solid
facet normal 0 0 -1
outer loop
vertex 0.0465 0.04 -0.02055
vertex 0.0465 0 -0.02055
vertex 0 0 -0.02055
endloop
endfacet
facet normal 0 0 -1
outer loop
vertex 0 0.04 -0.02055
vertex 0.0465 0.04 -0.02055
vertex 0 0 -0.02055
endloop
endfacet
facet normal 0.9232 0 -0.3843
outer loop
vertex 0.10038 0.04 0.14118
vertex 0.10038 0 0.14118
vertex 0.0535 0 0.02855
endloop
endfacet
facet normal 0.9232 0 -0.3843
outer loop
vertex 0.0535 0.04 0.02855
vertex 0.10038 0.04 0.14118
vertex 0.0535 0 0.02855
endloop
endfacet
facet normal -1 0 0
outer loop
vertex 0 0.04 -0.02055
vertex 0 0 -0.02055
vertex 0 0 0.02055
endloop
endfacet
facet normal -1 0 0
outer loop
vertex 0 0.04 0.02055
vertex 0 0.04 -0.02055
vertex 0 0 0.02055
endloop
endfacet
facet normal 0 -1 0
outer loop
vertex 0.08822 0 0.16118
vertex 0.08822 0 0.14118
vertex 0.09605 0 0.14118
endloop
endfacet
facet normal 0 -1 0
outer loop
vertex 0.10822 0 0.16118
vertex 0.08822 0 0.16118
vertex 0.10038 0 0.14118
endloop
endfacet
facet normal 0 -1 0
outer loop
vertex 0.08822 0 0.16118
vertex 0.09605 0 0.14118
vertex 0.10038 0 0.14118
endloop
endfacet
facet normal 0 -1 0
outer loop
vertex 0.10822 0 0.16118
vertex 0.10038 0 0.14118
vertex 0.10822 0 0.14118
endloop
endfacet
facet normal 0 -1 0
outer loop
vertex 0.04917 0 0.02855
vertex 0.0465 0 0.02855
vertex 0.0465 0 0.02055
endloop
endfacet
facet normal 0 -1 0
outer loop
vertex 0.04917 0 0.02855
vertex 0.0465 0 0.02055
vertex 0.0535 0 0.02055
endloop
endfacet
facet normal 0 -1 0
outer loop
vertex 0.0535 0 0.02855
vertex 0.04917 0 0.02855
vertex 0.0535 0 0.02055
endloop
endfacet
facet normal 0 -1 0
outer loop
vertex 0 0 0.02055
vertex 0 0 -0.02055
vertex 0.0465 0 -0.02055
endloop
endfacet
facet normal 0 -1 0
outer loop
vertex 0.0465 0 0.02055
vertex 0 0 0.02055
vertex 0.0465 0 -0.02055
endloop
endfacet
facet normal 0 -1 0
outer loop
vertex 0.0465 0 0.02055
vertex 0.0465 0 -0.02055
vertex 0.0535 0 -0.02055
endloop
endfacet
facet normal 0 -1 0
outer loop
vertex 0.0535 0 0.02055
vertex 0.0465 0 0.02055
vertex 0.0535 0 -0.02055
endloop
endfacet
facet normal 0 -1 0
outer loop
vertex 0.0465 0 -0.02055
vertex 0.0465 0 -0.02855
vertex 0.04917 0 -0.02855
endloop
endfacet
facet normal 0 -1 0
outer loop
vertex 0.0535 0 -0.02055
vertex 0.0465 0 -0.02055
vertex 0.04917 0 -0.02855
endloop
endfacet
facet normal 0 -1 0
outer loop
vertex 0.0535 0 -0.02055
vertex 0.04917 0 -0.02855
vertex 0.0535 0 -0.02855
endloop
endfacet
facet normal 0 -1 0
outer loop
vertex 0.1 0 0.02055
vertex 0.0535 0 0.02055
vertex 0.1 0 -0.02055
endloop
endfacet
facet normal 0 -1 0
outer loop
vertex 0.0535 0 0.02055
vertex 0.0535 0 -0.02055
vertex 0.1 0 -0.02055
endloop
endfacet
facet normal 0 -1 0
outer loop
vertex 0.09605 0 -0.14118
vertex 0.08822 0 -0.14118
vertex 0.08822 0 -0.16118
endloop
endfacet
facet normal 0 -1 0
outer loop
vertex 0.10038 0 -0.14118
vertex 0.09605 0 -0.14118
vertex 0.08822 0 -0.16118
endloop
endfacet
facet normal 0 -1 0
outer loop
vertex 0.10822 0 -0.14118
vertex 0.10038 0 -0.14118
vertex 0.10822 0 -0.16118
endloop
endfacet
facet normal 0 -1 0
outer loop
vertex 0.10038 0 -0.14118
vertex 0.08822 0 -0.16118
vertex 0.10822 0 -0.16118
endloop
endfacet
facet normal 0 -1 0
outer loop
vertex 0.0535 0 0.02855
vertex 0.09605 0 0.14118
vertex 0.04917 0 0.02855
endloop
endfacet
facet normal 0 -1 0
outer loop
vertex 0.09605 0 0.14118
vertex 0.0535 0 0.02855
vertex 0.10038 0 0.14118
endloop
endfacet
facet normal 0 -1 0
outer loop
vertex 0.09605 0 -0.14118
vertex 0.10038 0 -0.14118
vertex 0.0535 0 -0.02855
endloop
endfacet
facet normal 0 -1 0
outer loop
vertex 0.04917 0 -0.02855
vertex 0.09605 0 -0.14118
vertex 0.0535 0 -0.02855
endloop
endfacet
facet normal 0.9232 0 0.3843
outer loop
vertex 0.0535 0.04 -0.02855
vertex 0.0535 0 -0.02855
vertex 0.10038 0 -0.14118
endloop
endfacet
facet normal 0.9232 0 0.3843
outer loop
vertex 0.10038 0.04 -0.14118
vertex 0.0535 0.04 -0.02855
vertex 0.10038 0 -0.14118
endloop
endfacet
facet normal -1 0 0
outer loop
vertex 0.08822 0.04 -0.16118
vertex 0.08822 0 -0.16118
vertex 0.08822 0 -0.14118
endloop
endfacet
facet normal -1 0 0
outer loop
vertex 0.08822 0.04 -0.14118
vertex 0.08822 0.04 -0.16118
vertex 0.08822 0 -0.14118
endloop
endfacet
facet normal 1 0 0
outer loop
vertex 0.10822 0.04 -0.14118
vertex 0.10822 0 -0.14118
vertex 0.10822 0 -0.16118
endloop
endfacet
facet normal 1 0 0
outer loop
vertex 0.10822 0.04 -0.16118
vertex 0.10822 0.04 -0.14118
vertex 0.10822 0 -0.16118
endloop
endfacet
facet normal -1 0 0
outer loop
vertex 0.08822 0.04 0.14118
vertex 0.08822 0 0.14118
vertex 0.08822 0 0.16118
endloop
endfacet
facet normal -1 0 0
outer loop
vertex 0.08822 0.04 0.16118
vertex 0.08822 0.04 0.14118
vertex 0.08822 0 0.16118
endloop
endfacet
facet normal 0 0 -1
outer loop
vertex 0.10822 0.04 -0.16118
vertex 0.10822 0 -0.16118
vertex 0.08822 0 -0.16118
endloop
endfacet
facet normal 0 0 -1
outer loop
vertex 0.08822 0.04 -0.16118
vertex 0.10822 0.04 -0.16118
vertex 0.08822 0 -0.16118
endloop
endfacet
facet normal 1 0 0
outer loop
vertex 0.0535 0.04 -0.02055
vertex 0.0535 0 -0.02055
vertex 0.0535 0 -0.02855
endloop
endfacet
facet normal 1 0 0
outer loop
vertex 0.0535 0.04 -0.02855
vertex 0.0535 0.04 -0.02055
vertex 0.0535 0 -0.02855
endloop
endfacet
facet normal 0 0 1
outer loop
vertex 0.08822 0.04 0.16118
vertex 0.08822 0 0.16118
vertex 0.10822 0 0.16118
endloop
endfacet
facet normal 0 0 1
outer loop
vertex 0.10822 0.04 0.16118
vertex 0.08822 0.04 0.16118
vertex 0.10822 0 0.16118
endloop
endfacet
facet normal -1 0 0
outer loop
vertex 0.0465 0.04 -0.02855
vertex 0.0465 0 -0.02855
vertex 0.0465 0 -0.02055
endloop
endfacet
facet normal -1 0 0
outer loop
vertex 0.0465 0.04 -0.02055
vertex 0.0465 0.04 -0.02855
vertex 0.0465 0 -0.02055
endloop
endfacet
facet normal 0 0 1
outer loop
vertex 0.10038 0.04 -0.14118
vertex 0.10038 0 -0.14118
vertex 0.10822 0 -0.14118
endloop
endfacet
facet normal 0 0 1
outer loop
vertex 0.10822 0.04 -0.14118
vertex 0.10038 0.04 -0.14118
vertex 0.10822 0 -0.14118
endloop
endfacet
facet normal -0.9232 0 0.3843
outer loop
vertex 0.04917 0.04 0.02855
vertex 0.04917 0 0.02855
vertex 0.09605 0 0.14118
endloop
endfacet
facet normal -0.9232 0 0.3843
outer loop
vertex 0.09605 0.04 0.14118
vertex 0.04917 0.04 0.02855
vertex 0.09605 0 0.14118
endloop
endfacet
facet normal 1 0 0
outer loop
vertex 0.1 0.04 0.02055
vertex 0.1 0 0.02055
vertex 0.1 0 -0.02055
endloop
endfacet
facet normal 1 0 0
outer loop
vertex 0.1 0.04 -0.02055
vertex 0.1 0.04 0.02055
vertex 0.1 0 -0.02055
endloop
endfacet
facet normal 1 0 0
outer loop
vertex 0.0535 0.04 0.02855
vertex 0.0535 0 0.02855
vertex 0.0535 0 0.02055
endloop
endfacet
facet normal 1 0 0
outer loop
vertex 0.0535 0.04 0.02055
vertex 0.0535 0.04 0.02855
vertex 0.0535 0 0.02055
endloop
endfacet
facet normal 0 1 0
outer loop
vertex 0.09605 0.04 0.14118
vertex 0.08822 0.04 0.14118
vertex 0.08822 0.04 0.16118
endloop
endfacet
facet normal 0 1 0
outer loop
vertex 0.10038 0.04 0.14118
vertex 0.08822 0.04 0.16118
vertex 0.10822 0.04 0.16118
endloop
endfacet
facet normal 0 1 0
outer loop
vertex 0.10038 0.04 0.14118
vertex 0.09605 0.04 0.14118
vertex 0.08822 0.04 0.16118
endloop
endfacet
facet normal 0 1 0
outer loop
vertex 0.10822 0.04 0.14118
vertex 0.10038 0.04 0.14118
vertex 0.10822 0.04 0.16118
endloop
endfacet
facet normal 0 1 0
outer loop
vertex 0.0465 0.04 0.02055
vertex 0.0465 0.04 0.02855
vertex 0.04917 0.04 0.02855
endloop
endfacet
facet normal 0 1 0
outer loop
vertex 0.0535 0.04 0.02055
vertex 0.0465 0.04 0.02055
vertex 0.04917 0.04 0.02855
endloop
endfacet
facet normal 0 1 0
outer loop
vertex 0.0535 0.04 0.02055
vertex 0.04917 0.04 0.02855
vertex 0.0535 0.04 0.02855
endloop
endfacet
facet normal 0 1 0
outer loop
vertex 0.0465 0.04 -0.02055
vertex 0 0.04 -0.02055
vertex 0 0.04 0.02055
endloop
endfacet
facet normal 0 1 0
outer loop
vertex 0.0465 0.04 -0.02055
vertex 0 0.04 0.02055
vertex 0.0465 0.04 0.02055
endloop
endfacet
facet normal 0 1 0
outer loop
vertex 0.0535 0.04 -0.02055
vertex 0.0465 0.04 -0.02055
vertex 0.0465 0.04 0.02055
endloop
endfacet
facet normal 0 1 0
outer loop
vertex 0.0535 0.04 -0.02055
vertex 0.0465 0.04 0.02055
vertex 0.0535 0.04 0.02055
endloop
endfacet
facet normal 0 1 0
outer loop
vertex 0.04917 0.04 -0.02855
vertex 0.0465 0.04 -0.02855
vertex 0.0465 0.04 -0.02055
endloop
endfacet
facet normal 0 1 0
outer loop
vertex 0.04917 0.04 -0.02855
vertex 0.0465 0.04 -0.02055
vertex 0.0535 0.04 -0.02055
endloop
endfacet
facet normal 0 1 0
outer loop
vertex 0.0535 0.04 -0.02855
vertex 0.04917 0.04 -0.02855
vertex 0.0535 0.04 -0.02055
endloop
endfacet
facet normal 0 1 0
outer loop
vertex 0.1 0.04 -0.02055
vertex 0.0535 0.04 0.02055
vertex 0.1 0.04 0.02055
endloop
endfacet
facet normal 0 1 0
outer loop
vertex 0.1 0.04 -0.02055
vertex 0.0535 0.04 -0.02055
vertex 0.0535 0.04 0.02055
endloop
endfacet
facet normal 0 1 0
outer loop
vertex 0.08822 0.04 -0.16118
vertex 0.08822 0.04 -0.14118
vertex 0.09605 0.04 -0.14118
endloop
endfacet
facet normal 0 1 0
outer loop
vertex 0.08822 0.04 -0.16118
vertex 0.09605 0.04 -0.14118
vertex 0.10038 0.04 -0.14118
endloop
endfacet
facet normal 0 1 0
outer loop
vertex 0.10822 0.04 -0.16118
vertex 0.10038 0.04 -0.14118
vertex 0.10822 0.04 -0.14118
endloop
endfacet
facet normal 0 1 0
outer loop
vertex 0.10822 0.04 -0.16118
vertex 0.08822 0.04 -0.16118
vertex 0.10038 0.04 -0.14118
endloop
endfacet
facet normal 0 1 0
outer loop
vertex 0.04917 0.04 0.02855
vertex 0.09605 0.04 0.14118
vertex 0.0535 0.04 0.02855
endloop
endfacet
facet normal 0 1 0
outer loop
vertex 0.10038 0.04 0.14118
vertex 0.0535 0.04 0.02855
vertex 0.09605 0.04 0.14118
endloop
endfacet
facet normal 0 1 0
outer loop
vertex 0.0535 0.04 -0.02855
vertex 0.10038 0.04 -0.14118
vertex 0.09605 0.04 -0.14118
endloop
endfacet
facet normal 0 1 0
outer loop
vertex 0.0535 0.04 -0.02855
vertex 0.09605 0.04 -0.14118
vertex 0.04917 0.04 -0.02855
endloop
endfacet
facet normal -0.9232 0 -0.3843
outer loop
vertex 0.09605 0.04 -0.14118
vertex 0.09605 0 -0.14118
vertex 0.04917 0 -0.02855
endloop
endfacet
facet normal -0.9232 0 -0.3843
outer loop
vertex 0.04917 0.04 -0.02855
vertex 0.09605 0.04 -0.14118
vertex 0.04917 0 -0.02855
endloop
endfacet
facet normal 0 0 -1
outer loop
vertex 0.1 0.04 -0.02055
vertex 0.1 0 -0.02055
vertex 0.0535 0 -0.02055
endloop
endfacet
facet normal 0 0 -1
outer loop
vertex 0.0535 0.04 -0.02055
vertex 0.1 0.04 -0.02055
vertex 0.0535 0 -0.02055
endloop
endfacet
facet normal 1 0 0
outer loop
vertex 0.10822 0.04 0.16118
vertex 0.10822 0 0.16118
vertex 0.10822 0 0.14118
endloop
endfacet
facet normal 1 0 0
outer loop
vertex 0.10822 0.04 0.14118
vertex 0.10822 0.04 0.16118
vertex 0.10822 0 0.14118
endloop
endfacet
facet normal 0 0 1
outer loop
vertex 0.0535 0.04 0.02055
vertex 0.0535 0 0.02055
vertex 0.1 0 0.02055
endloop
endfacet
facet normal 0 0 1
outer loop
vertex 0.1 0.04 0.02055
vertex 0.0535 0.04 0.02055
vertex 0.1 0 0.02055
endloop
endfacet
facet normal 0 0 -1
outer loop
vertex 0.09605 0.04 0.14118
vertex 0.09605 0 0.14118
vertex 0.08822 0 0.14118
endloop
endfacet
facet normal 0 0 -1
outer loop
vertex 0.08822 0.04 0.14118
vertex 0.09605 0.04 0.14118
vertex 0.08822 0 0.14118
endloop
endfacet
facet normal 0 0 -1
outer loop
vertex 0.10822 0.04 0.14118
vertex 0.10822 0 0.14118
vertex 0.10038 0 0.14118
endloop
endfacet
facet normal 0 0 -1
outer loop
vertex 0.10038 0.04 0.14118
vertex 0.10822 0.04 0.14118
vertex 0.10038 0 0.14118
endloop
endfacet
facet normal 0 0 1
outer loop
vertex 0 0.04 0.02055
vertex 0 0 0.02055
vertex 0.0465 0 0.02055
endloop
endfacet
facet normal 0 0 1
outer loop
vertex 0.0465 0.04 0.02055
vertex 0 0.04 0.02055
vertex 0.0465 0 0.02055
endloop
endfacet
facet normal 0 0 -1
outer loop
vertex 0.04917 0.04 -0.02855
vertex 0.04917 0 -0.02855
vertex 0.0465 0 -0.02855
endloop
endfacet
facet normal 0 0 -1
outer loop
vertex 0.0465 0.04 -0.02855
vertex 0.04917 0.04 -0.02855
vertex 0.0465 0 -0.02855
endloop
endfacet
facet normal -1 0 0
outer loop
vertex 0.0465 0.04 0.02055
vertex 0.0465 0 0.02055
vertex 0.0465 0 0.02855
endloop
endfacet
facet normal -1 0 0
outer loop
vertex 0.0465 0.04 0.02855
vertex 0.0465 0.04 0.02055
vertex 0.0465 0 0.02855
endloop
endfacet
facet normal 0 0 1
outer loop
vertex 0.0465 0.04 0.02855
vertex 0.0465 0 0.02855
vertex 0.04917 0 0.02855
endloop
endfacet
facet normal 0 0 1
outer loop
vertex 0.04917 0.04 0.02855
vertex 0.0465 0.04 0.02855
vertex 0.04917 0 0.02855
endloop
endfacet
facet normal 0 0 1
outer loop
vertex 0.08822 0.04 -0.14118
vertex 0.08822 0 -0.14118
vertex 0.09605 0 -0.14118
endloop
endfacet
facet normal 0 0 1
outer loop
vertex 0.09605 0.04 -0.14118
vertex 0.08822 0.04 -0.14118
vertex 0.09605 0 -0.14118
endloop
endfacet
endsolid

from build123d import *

# Parameters (mm, degrees)
BOSS_EXTRUDE1_DEPTH = 0.04


with BuildPart() as part:
    # Sketch1 → Boss-Extrude1 (new body)
    with BuildSketch(Plane(origin=(0, 0, 0), x_dir=(1, 0, 0), z_dir=(0, 1, 0))):
        Polygon((0.0465, 0.02055), (0, 0.02055), (0, -0.02055), (0.0465, -0.02055), (0.0535, -0.02055), (0.1, -0.02055), (0.1, 0.02055), (0.0535, 0.02055), align=None)
        Polygon((0.0465, 0.02855), (0.0465, 0.02055), (0.0535, 0.02055), (0.0535, 0.02855), (0.049167292, 0.02855), align=None)
        Polygon((0.0535, -0.02055), (0.0465, -0.02055), (0.0465, -0.02855), (0.049167292, -0.02855), (0.0535, -0.02855), align=None)
        Polygon((0.049167292, 0.02855), (0.0535, 0.02855), (0.100384029, 0.141181646), (0.096051322, 0.141181646), align=None)
        Polygon((0.096051322, 0.141181646), (0.100384029, 0.141181646), (0.108217676, 0.141181646), (0.108217676, 0.161181646), (0.088217676, 0.161181646), (0.088217676, 0.141181646), align=None)
        Polygon((0.100384029, -0.141181646), (0.0535, -0.02855), (0.049167292, -0.02855), (0.096051322, -0.141181646), align=None)
        Polygon((0.108217676, -0.141181646), (0.100384029, -0.141181646), (0.096051322, -0.141181646), (0.088217676, -0.141181646), (0.088217676, -0.161181646), (0.108217676, -0.161181646), align=None)
    extrude(amount=BOSS_EXTRUDE1_DEPTH)


solid = part.part
